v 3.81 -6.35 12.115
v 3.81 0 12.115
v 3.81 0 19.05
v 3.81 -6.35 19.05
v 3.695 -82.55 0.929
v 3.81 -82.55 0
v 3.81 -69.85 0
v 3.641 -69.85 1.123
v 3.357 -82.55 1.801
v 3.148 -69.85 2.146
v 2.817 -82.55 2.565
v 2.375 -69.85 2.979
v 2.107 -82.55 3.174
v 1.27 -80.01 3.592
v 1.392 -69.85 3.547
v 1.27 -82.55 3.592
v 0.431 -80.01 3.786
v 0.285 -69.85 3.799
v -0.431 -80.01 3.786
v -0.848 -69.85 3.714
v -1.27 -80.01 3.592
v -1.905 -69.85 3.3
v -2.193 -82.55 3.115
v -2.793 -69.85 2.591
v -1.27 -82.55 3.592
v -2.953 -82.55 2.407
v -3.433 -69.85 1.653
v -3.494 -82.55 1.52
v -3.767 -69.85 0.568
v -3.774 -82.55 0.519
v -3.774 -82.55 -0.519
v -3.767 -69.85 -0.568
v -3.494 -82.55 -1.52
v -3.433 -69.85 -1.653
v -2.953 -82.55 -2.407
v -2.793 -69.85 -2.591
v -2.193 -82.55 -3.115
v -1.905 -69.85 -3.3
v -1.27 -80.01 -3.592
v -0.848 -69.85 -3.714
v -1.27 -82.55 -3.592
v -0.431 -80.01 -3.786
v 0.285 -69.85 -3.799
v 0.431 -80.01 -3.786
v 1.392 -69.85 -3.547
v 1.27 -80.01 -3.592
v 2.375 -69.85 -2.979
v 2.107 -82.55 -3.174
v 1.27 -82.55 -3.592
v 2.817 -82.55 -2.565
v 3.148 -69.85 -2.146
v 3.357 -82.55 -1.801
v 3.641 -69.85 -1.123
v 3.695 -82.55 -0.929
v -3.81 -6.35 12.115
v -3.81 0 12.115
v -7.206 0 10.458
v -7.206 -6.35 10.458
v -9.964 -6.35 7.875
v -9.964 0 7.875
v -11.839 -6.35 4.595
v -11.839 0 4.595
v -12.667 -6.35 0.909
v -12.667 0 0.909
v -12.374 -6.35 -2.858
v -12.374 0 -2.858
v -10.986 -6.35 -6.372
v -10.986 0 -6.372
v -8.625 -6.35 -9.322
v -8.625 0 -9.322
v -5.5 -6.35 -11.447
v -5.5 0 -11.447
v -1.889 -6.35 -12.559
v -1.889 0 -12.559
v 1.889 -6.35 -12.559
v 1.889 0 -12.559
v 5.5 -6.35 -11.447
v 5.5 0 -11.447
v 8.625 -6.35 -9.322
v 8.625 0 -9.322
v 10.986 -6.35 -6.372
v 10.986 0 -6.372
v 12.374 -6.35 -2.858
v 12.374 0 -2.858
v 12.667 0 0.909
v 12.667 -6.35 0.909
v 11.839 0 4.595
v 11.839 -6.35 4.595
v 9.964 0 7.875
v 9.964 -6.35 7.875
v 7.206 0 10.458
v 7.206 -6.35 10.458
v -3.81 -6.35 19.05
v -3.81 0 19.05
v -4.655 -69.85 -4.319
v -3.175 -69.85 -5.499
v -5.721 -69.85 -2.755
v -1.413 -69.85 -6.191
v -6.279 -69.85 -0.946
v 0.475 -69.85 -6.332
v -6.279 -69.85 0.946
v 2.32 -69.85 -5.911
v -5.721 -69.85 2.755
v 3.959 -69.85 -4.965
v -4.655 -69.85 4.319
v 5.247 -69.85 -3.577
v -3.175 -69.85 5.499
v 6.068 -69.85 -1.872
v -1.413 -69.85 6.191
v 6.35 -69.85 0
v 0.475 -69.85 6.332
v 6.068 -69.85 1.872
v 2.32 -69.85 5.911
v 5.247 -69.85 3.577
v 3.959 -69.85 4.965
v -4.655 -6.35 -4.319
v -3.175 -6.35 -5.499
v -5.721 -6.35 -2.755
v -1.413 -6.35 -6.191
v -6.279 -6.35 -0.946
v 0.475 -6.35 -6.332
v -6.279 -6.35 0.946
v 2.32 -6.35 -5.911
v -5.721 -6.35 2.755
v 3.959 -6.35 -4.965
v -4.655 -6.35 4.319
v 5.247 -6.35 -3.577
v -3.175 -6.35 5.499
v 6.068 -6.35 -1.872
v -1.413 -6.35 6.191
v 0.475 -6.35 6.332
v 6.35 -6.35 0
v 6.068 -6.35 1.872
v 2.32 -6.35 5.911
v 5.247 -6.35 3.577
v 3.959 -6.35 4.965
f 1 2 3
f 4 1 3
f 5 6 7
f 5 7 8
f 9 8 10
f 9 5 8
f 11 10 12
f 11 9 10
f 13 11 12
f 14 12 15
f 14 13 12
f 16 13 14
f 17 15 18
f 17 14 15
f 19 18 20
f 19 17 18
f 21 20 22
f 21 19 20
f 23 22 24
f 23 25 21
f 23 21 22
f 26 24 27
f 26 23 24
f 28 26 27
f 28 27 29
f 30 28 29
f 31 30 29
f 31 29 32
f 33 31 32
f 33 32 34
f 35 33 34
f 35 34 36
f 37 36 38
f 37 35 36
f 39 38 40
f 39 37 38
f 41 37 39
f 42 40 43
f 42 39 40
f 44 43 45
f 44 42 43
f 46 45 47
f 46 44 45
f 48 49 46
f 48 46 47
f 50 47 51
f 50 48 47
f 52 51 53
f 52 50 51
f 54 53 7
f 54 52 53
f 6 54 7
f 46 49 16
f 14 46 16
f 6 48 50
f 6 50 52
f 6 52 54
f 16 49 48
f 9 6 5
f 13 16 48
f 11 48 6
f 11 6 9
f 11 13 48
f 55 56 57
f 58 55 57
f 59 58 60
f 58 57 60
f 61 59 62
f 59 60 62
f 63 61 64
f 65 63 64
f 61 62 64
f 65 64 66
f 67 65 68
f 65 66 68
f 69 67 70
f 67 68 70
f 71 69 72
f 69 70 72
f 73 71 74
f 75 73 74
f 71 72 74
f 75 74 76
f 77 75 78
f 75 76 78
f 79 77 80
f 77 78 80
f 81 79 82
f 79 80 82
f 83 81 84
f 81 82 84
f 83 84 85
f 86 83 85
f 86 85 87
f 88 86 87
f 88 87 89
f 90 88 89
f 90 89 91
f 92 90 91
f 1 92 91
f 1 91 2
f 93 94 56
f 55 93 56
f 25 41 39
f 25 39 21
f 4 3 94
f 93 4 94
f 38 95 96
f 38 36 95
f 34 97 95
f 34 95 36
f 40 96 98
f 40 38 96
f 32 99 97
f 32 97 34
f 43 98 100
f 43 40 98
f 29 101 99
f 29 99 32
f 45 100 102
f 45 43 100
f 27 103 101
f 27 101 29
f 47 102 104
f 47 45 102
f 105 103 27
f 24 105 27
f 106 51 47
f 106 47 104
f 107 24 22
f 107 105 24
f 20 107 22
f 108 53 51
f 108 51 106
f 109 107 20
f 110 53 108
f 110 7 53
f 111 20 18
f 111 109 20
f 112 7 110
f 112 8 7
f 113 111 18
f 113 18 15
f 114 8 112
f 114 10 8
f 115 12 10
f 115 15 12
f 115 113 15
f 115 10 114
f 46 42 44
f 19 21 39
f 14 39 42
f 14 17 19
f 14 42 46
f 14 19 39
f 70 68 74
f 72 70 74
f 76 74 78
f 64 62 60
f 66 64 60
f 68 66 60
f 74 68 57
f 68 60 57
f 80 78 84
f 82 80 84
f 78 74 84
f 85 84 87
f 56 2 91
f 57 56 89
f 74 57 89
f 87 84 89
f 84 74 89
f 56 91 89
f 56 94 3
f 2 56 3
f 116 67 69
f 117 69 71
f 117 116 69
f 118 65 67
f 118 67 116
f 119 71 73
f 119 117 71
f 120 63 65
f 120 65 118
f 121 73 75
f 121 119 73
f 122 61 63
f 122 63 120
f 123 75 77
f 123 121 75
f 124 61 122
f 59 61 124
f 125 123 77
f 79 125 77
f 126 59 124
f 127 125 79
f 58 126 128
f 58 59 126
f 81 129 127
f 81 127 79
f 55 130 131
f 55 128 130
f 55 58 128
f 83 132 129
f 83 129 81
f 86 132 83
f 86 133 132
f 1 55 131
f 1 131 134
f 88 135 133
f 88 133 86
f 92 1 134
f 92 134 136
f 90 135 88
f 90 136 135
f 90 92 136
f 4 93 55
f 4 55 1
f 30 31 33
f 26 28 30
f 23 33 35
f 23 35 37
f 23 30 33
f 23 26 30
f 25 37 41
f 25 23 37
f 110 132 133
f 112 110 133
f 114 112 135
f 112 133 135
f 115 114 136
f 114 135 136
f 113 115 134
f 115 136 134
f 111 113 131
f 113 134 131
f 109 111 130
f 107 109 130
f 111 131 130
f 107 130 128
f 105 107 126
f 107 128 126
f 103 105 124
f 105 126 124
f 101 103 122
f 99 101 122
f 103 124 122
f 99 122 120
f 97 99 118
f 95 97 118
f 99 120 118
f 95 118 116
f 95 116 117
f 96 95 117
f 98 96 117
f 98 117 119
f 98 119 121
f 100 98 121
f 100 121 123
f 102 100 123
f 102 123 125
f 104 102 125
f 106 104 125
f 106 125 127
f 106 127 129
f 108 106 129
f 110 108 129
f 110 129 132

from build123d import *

# Parameters (mm, degrees)
F1_DEPTH = 6.35
F2_R     = 6.35
F3_DEPTH = 76.2
F4_R     = 6.35
F4_R_2   = 3.81
F5_DEPTH = 12.7
F6_W     = 2.54
F6_H     = 25.4
F7_DEPTH = 2.54


with BuildPart() as f1:
    # F0 (on Front) → F1 (new body)
    with BuildSketch(Plane.XZ):
        with BuildLine():
            Line((-3.81, 19.05), (-3.81, 12.115028))
            ThreePointArc((-3.81, 12.115028), (0, -12.7), (3.81, 12.115028))
            Line((3.81, 12.115028), (3.81, 19.05))
            Line((3.81, 19.05), (-3.81, 19.05))
        make_face()
    extrude(amount=F1_DEPTH)

    # F2 (on face) → F3 (join)
    with BuildSketch(Plane.XZ.offset(6.35)):
        Circle(F2_R)
    extrude(amount=F3_DEPTH)

    # F4 (on face) → F5 (cut)
    with BuildSketch(Plane.XZ.offset(82.55)):
        Circle(F4_R)
        Circle(F4_R_2, mode=Mode.SUBTRACT)
    extrude(amount=-F5_DEPTH, mode=Mode.SUBTRACT)

    # F6 (on face) → F7 (cut)
    with BuildSketch(Plane.XZ.offset(82.55)):
        Rectangle(F6_W, F6_H)
    extrude(amount=-F7_DEPTH, mode=Mode.SUBTRACT)


solid = f1.part
